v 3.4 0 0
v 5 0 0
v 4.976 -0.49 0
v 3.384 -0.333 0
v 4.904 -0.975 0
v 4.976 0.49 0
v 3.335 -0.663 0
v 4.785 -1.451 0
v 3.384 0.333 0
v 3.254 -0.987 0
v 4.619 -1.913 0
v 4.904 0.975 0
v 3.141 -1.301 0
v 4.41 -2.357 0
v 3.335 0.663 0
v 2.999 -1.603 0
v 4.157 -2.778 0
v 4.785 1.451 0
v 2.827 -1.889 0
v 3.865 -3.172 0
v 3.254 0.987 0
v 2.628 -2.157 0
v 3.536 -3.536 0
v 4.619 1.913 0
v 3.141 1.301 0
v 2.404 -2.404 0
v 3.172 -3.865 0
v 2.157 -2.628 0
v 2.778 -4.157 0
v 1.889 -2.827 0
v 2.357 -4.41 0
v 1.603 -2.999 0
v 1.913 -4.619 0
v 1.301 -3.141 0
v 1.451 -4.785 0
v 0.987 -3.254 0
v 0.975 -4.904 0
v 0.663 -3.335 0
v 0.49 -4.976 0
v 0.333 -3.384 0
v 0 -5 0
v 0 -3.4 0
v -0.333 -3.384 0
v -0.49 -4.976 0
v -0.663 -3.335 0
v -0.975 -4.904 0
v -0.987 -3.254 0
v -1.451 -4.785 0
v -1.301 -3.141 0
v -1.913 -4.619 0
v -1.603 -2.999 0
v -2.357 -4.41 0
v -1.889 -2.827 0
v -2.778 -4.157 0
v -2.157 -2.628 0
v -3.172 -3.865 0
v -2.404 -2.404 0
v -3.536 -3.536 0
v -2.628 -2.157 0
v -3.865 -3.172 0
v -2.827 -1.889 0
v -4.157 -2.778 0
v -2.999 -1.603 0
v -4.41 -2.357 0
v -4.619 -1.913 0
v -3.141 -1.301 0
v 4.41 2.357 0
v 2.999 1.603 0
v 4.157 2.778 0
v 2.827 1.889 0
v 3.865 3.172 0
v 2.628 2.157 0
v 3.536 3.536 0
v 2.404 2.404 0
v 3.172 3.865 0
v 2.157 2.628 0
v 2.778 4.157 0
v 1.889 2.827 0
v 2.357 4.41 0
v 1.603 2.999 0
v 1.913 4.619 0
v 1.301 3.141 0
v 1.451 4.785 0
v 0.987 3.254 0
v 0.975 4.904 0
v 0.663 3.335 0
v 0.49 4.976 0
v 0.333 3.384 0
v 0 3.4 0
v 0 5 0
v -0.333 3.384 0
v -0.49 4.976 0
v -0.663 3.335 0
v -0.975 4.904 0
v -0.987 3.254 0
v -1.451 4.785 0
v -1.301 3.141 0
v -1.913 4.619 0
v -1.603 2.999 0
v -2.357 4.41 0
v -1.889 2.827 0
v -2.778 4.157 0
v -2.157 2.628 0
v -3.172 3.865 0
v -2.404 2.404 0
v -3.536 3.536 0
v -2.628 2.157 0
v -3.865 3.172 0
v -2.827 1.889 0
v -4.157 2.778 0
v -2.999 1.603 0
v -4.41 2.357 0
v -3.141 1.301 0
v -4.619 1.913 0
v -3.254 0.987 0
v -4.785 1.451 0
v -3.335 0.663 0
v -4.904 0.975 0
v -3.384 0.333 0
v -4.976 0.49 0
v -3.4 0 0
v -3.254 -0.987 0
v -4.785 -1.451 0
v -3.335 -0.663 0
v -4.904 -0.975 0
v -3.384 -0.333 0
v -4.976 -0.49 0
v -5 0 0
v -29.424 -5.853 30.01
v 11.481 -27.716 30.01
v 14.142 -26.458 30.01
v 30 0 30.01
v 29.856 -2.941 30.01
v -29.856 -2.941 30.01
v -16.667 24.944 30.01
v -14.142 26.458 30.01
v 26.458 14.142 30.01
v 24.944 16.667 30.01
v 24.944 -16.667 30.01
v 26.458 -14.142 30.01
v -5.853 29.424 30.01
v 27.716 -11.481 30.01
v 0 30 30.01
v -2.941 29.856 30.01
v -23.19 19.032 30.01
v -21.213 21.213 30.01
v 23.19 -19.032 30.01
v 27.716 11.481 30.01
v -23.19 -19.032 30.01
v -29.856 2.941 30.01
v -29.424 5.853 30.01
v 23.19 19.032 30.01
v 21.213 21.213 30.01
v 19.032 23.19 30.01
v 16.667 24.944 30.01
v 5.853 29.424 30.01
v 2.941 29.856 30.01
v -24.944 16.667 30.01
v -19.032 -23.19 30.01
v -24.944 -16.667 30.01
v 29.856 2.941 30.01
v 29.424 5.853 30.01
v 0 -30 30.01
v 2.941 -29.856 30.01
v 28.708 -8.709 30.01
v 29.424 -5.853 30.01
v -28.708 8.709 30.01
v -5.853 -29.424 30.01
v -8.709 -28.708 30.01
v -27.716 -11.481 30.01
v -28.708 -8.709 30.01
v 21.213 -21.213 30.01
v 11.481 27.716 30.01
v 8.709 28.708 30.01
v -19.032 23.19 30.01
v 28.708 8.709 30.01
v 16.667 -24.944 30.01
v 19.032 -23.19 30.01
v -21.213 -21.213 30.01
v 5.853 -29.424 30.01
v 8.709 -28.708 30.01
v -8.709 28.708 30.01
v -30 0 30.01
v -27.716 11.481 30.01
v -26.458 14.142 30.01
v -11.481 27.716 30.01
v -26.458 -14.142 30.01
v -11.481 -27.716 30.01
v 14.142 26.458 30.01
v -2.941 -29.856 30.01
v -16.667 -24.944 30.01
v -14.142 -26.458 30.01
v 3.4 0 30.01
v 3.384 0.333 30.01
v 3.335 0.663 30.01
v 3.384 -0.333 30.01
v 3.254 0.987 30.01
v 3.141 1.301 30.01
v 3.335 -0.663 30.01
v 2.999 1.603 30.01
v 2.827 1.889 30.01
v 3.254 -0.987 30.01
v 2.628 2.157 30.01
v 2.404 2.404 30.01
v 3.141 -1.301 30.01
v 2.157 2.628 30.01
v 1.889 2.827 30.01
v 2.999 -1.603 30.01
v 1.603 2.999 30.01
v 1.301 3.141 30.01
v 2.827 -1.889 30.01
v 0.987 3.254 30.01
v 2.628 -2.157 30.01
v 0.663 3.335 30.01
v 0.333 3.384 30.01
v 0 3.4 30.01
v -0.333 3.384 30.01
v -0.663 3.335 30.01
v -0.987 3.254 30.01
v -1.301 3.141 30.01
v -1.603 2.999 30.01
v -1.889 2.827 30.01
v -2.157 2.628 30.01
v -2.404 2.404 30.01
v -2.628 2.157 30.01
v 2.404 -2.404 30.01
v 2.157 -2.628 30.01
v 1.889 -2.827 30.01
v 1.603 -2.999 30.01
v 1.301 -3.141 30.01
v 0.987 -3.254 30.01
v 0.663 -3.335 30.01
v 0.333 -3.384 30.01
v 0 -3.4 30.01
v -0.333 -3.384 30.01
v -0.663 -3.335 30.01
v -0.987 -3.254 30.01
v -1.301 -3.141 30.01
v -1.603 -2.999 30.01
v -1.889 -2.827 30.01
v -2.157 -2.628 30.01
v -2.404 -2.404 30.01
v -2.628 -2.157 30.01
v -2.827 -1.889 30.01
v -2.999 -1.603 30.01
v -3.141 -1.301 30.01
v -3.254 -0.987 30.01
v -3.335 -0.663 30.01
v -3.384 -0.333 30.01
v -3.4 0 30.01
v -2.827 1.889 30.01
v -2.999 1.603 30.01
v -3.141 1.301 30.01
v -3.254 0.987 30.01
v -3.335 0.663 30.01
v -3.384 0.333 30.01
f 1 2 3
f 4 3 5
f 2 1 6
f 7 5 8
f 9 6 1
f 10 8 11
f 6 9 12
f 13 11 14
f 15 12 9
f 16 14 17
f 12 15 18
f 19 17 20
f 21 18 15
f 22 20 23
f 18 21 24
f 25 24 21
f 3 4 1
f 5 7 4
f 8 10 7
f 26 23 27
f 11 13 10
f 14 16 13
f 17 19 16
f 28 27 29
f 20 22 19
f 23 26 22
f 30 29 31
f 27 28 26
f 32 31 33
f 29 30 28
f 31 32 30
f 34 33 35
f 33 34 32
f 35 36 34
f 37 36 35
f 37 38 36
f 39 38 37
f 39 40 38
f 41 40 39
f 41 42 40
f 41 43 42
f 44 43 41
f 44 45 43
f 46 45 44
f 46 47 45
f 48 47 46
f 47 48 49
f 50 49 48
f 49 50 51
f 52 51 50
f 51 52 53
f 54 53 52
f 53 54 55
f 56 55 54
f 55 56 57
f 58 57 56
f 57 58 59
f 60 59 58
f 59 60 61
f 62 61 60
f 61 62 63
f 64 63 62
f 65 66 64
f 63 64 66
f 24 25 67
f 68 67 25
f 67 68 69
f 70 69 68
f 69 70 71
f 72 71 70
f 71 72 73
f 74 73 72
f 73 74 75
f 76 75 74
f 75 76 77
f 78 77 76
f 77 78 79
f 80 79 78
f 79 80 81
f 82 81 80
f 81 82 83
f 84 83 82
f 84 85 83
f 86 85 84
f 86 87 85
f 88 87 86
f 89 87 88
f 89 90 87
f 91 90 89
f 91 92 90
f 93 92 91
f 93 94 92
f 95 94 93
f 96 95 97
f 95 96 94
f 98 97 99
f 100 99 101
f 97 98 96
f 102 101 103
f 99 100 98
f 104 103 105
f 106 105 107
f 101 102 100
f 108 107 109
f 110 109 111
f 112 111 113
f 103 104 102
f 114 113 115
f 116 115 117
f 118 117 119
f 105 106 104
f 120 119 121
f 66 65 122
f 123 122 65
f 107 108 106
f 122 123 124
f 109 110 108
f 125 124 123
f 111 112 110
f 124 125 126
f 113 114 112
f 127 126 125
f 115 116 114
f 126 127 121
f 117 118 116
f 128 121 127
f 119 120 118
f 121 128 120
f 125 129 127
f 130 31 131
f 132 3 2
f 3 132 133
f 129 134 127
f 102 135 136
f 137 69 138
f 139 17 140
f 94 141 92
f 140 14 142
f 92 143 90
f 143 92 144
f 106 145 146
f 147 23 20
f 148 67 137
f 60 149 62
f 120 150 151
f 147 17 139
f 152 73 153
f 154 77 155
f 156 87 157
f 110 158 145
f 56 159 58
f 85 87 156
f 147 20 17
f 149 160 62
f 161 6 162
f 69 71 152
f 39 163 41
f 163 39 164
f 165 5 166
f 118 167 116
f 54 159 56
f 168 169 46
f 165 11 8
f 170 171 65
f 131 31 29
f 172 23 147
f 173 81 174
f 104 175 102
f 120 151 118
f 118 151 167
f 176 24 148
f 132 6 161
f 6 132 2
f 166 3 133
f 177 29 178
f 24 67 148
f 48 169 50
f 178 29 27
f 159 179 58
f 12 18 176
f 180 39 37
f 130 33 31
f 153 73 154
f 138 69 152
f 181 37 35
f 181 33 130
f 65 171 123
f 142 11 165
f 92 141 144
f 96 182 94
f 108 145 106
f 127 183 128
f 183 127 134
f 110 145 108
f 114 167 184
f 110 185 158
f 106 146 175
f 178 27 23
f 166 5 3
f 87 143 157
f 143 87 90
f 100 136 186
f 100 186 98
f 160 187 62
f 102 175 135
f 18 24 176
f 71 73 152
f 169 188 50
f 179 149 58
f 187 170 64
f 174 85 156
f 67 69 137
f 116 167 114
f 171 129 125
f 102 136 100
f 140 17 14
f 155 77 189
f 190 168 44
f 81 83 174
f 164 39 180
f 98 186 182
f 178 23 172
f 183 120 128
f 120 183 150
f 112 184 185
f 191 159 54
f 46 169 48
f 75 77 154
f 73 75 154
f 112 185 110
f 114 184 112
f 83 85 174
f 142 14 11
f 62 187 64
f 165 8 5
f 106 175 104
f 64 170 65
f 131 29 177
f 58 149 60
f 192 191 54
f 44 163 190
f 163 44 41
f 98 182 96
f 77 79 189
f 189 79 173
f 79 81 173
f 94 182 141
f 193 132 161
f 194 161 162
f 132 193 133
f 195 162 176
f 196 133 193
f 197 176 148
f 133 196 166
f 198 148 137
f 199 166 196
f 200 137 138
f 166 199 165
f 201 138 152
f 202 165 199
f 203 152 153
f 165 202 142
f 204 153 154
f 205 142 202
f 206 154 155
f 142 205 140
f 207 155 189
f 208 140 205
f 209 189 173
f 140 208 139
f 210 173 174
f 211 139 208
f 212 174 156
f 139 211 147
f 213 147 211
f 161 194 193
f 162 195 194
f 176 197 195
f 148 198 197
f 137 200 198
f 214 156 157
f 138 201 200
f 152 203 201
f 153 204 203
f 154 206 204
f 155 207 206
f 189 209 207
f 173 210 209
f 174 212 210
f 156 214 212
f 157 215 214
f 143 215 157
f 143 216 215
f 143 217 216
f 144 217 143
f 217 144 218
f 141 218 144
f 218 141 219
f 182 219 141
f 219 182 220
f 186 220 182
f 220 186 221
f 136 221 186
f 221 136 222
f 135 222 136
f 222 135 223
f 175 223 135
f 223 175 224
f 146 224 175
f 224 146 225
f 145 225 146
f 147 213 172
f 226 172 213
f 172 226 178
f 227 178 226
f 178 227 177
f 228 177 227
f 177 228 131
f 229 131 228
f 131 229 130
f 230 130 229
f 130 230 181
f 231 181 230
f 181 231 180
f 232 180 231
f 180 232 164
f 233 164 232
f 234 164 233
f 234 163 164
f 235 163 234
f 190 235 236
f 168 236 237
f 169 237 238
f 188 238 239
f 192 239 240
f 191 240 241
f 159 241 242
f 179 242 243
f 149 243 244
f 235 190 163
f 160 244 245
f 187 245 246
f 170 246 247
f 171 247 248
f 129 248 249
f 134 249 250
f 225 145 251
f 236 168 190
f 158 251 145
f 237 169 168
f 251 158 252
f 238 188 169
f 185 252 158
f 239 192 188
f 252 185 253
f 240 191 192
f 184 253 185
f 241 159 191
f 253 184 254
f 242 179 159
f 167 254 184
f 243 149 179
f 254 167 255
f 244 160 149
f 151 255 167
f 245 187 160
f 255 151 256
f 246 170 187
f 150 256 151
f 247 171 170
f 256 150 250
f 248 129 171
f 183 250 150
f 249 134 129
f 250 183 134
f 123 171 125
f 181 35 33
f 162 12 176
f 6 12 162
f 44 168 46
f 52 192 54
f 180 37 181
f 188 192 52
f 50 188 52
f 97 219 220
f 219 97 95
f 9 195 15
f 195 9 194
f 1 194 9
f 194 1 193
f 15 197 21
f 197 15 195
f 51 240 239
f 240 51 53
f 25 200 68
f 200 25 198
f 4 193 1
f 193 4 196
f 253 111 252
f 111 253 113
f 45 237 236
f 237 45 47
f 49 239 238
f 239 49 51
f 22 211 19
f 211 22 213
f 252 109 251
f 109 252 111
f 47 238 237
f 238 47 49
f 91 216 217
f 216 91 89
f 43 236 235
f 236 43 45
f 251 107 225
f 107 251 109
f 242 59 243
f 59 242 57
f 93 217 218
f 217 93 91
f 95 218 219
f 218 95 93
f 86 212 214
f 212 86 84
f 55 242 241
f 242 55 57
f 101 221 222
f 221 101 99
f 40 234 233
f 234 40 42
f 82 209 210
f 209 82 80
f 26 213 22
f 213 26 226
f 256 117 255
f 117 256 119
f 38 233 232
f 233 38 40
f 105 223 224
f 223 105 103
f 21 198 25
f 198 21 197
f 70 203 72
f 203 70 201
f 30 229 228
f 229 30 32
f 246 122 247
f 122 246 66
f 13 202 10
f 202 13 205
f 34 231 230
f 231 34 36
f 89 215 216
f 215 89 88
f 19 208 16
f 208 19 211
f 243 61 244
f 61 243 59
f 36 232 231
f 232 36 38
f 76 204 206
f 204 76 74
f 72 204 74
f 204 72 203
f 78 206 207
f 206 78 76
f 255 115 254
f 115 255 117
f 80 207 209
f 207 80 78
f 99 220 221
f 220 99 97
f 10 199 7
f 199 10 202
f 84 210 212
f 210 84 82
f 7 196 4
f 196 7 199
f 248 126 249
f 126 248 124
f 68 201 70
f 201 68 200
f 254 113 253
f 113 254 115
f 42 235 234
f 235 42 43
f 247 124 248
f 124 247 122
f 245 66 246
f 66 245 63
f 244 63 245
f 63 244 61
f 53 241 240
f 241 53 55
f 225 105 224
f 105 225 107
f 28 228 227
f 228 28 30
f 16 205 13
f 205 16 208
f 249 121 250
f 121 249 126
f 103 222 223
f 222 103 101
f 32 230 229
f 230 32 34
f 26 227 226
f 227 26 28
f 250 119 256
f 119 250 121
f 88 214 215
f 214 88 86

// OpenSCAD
// Small lab funnel - printed upright, open top and bottom
// Units: mm. Wall thickness: 1.6.

$fn = 64;

// --- Spout ---
spout_od    = 10;   // outer diameter of spout (z = 0 to 20)
spout_id    = spout_od - 2 * 1.6;  // bore diameter (6.8)
spout_len   = 20;   // spout length (z = 0 to 20)

// --- Cone ---
cone_od_bot = spout_od;   // cone outer diameter at z = 20 (seam with spout)
cone_od_top = 60;         // cone outer diameter at rim (z = 50)
cone_top_z  = 50;         // rim height
cone_h      = cone_top_z - spout_len;  // cone height (30)

// --- Cut overlap ---
eps = 0.5;          // extension of cutting shapes past faces

difference() {
    union() {
        // Spout tube
        cylinder(d = spout_od, h = spout_len);
        // Cone (slightly overlaps spout to fuse solidly)
        cylinder(d1 = cone_od_bot, d2 = cone_od_top, h = cone_h + 0.01);
    }
    // Through-bore: straight through spout and up the cone axis
    translate([0, 0, -eps])
        cylinder(d = spout_id, h = spout_len + cone_h + 2 * eps);
}
